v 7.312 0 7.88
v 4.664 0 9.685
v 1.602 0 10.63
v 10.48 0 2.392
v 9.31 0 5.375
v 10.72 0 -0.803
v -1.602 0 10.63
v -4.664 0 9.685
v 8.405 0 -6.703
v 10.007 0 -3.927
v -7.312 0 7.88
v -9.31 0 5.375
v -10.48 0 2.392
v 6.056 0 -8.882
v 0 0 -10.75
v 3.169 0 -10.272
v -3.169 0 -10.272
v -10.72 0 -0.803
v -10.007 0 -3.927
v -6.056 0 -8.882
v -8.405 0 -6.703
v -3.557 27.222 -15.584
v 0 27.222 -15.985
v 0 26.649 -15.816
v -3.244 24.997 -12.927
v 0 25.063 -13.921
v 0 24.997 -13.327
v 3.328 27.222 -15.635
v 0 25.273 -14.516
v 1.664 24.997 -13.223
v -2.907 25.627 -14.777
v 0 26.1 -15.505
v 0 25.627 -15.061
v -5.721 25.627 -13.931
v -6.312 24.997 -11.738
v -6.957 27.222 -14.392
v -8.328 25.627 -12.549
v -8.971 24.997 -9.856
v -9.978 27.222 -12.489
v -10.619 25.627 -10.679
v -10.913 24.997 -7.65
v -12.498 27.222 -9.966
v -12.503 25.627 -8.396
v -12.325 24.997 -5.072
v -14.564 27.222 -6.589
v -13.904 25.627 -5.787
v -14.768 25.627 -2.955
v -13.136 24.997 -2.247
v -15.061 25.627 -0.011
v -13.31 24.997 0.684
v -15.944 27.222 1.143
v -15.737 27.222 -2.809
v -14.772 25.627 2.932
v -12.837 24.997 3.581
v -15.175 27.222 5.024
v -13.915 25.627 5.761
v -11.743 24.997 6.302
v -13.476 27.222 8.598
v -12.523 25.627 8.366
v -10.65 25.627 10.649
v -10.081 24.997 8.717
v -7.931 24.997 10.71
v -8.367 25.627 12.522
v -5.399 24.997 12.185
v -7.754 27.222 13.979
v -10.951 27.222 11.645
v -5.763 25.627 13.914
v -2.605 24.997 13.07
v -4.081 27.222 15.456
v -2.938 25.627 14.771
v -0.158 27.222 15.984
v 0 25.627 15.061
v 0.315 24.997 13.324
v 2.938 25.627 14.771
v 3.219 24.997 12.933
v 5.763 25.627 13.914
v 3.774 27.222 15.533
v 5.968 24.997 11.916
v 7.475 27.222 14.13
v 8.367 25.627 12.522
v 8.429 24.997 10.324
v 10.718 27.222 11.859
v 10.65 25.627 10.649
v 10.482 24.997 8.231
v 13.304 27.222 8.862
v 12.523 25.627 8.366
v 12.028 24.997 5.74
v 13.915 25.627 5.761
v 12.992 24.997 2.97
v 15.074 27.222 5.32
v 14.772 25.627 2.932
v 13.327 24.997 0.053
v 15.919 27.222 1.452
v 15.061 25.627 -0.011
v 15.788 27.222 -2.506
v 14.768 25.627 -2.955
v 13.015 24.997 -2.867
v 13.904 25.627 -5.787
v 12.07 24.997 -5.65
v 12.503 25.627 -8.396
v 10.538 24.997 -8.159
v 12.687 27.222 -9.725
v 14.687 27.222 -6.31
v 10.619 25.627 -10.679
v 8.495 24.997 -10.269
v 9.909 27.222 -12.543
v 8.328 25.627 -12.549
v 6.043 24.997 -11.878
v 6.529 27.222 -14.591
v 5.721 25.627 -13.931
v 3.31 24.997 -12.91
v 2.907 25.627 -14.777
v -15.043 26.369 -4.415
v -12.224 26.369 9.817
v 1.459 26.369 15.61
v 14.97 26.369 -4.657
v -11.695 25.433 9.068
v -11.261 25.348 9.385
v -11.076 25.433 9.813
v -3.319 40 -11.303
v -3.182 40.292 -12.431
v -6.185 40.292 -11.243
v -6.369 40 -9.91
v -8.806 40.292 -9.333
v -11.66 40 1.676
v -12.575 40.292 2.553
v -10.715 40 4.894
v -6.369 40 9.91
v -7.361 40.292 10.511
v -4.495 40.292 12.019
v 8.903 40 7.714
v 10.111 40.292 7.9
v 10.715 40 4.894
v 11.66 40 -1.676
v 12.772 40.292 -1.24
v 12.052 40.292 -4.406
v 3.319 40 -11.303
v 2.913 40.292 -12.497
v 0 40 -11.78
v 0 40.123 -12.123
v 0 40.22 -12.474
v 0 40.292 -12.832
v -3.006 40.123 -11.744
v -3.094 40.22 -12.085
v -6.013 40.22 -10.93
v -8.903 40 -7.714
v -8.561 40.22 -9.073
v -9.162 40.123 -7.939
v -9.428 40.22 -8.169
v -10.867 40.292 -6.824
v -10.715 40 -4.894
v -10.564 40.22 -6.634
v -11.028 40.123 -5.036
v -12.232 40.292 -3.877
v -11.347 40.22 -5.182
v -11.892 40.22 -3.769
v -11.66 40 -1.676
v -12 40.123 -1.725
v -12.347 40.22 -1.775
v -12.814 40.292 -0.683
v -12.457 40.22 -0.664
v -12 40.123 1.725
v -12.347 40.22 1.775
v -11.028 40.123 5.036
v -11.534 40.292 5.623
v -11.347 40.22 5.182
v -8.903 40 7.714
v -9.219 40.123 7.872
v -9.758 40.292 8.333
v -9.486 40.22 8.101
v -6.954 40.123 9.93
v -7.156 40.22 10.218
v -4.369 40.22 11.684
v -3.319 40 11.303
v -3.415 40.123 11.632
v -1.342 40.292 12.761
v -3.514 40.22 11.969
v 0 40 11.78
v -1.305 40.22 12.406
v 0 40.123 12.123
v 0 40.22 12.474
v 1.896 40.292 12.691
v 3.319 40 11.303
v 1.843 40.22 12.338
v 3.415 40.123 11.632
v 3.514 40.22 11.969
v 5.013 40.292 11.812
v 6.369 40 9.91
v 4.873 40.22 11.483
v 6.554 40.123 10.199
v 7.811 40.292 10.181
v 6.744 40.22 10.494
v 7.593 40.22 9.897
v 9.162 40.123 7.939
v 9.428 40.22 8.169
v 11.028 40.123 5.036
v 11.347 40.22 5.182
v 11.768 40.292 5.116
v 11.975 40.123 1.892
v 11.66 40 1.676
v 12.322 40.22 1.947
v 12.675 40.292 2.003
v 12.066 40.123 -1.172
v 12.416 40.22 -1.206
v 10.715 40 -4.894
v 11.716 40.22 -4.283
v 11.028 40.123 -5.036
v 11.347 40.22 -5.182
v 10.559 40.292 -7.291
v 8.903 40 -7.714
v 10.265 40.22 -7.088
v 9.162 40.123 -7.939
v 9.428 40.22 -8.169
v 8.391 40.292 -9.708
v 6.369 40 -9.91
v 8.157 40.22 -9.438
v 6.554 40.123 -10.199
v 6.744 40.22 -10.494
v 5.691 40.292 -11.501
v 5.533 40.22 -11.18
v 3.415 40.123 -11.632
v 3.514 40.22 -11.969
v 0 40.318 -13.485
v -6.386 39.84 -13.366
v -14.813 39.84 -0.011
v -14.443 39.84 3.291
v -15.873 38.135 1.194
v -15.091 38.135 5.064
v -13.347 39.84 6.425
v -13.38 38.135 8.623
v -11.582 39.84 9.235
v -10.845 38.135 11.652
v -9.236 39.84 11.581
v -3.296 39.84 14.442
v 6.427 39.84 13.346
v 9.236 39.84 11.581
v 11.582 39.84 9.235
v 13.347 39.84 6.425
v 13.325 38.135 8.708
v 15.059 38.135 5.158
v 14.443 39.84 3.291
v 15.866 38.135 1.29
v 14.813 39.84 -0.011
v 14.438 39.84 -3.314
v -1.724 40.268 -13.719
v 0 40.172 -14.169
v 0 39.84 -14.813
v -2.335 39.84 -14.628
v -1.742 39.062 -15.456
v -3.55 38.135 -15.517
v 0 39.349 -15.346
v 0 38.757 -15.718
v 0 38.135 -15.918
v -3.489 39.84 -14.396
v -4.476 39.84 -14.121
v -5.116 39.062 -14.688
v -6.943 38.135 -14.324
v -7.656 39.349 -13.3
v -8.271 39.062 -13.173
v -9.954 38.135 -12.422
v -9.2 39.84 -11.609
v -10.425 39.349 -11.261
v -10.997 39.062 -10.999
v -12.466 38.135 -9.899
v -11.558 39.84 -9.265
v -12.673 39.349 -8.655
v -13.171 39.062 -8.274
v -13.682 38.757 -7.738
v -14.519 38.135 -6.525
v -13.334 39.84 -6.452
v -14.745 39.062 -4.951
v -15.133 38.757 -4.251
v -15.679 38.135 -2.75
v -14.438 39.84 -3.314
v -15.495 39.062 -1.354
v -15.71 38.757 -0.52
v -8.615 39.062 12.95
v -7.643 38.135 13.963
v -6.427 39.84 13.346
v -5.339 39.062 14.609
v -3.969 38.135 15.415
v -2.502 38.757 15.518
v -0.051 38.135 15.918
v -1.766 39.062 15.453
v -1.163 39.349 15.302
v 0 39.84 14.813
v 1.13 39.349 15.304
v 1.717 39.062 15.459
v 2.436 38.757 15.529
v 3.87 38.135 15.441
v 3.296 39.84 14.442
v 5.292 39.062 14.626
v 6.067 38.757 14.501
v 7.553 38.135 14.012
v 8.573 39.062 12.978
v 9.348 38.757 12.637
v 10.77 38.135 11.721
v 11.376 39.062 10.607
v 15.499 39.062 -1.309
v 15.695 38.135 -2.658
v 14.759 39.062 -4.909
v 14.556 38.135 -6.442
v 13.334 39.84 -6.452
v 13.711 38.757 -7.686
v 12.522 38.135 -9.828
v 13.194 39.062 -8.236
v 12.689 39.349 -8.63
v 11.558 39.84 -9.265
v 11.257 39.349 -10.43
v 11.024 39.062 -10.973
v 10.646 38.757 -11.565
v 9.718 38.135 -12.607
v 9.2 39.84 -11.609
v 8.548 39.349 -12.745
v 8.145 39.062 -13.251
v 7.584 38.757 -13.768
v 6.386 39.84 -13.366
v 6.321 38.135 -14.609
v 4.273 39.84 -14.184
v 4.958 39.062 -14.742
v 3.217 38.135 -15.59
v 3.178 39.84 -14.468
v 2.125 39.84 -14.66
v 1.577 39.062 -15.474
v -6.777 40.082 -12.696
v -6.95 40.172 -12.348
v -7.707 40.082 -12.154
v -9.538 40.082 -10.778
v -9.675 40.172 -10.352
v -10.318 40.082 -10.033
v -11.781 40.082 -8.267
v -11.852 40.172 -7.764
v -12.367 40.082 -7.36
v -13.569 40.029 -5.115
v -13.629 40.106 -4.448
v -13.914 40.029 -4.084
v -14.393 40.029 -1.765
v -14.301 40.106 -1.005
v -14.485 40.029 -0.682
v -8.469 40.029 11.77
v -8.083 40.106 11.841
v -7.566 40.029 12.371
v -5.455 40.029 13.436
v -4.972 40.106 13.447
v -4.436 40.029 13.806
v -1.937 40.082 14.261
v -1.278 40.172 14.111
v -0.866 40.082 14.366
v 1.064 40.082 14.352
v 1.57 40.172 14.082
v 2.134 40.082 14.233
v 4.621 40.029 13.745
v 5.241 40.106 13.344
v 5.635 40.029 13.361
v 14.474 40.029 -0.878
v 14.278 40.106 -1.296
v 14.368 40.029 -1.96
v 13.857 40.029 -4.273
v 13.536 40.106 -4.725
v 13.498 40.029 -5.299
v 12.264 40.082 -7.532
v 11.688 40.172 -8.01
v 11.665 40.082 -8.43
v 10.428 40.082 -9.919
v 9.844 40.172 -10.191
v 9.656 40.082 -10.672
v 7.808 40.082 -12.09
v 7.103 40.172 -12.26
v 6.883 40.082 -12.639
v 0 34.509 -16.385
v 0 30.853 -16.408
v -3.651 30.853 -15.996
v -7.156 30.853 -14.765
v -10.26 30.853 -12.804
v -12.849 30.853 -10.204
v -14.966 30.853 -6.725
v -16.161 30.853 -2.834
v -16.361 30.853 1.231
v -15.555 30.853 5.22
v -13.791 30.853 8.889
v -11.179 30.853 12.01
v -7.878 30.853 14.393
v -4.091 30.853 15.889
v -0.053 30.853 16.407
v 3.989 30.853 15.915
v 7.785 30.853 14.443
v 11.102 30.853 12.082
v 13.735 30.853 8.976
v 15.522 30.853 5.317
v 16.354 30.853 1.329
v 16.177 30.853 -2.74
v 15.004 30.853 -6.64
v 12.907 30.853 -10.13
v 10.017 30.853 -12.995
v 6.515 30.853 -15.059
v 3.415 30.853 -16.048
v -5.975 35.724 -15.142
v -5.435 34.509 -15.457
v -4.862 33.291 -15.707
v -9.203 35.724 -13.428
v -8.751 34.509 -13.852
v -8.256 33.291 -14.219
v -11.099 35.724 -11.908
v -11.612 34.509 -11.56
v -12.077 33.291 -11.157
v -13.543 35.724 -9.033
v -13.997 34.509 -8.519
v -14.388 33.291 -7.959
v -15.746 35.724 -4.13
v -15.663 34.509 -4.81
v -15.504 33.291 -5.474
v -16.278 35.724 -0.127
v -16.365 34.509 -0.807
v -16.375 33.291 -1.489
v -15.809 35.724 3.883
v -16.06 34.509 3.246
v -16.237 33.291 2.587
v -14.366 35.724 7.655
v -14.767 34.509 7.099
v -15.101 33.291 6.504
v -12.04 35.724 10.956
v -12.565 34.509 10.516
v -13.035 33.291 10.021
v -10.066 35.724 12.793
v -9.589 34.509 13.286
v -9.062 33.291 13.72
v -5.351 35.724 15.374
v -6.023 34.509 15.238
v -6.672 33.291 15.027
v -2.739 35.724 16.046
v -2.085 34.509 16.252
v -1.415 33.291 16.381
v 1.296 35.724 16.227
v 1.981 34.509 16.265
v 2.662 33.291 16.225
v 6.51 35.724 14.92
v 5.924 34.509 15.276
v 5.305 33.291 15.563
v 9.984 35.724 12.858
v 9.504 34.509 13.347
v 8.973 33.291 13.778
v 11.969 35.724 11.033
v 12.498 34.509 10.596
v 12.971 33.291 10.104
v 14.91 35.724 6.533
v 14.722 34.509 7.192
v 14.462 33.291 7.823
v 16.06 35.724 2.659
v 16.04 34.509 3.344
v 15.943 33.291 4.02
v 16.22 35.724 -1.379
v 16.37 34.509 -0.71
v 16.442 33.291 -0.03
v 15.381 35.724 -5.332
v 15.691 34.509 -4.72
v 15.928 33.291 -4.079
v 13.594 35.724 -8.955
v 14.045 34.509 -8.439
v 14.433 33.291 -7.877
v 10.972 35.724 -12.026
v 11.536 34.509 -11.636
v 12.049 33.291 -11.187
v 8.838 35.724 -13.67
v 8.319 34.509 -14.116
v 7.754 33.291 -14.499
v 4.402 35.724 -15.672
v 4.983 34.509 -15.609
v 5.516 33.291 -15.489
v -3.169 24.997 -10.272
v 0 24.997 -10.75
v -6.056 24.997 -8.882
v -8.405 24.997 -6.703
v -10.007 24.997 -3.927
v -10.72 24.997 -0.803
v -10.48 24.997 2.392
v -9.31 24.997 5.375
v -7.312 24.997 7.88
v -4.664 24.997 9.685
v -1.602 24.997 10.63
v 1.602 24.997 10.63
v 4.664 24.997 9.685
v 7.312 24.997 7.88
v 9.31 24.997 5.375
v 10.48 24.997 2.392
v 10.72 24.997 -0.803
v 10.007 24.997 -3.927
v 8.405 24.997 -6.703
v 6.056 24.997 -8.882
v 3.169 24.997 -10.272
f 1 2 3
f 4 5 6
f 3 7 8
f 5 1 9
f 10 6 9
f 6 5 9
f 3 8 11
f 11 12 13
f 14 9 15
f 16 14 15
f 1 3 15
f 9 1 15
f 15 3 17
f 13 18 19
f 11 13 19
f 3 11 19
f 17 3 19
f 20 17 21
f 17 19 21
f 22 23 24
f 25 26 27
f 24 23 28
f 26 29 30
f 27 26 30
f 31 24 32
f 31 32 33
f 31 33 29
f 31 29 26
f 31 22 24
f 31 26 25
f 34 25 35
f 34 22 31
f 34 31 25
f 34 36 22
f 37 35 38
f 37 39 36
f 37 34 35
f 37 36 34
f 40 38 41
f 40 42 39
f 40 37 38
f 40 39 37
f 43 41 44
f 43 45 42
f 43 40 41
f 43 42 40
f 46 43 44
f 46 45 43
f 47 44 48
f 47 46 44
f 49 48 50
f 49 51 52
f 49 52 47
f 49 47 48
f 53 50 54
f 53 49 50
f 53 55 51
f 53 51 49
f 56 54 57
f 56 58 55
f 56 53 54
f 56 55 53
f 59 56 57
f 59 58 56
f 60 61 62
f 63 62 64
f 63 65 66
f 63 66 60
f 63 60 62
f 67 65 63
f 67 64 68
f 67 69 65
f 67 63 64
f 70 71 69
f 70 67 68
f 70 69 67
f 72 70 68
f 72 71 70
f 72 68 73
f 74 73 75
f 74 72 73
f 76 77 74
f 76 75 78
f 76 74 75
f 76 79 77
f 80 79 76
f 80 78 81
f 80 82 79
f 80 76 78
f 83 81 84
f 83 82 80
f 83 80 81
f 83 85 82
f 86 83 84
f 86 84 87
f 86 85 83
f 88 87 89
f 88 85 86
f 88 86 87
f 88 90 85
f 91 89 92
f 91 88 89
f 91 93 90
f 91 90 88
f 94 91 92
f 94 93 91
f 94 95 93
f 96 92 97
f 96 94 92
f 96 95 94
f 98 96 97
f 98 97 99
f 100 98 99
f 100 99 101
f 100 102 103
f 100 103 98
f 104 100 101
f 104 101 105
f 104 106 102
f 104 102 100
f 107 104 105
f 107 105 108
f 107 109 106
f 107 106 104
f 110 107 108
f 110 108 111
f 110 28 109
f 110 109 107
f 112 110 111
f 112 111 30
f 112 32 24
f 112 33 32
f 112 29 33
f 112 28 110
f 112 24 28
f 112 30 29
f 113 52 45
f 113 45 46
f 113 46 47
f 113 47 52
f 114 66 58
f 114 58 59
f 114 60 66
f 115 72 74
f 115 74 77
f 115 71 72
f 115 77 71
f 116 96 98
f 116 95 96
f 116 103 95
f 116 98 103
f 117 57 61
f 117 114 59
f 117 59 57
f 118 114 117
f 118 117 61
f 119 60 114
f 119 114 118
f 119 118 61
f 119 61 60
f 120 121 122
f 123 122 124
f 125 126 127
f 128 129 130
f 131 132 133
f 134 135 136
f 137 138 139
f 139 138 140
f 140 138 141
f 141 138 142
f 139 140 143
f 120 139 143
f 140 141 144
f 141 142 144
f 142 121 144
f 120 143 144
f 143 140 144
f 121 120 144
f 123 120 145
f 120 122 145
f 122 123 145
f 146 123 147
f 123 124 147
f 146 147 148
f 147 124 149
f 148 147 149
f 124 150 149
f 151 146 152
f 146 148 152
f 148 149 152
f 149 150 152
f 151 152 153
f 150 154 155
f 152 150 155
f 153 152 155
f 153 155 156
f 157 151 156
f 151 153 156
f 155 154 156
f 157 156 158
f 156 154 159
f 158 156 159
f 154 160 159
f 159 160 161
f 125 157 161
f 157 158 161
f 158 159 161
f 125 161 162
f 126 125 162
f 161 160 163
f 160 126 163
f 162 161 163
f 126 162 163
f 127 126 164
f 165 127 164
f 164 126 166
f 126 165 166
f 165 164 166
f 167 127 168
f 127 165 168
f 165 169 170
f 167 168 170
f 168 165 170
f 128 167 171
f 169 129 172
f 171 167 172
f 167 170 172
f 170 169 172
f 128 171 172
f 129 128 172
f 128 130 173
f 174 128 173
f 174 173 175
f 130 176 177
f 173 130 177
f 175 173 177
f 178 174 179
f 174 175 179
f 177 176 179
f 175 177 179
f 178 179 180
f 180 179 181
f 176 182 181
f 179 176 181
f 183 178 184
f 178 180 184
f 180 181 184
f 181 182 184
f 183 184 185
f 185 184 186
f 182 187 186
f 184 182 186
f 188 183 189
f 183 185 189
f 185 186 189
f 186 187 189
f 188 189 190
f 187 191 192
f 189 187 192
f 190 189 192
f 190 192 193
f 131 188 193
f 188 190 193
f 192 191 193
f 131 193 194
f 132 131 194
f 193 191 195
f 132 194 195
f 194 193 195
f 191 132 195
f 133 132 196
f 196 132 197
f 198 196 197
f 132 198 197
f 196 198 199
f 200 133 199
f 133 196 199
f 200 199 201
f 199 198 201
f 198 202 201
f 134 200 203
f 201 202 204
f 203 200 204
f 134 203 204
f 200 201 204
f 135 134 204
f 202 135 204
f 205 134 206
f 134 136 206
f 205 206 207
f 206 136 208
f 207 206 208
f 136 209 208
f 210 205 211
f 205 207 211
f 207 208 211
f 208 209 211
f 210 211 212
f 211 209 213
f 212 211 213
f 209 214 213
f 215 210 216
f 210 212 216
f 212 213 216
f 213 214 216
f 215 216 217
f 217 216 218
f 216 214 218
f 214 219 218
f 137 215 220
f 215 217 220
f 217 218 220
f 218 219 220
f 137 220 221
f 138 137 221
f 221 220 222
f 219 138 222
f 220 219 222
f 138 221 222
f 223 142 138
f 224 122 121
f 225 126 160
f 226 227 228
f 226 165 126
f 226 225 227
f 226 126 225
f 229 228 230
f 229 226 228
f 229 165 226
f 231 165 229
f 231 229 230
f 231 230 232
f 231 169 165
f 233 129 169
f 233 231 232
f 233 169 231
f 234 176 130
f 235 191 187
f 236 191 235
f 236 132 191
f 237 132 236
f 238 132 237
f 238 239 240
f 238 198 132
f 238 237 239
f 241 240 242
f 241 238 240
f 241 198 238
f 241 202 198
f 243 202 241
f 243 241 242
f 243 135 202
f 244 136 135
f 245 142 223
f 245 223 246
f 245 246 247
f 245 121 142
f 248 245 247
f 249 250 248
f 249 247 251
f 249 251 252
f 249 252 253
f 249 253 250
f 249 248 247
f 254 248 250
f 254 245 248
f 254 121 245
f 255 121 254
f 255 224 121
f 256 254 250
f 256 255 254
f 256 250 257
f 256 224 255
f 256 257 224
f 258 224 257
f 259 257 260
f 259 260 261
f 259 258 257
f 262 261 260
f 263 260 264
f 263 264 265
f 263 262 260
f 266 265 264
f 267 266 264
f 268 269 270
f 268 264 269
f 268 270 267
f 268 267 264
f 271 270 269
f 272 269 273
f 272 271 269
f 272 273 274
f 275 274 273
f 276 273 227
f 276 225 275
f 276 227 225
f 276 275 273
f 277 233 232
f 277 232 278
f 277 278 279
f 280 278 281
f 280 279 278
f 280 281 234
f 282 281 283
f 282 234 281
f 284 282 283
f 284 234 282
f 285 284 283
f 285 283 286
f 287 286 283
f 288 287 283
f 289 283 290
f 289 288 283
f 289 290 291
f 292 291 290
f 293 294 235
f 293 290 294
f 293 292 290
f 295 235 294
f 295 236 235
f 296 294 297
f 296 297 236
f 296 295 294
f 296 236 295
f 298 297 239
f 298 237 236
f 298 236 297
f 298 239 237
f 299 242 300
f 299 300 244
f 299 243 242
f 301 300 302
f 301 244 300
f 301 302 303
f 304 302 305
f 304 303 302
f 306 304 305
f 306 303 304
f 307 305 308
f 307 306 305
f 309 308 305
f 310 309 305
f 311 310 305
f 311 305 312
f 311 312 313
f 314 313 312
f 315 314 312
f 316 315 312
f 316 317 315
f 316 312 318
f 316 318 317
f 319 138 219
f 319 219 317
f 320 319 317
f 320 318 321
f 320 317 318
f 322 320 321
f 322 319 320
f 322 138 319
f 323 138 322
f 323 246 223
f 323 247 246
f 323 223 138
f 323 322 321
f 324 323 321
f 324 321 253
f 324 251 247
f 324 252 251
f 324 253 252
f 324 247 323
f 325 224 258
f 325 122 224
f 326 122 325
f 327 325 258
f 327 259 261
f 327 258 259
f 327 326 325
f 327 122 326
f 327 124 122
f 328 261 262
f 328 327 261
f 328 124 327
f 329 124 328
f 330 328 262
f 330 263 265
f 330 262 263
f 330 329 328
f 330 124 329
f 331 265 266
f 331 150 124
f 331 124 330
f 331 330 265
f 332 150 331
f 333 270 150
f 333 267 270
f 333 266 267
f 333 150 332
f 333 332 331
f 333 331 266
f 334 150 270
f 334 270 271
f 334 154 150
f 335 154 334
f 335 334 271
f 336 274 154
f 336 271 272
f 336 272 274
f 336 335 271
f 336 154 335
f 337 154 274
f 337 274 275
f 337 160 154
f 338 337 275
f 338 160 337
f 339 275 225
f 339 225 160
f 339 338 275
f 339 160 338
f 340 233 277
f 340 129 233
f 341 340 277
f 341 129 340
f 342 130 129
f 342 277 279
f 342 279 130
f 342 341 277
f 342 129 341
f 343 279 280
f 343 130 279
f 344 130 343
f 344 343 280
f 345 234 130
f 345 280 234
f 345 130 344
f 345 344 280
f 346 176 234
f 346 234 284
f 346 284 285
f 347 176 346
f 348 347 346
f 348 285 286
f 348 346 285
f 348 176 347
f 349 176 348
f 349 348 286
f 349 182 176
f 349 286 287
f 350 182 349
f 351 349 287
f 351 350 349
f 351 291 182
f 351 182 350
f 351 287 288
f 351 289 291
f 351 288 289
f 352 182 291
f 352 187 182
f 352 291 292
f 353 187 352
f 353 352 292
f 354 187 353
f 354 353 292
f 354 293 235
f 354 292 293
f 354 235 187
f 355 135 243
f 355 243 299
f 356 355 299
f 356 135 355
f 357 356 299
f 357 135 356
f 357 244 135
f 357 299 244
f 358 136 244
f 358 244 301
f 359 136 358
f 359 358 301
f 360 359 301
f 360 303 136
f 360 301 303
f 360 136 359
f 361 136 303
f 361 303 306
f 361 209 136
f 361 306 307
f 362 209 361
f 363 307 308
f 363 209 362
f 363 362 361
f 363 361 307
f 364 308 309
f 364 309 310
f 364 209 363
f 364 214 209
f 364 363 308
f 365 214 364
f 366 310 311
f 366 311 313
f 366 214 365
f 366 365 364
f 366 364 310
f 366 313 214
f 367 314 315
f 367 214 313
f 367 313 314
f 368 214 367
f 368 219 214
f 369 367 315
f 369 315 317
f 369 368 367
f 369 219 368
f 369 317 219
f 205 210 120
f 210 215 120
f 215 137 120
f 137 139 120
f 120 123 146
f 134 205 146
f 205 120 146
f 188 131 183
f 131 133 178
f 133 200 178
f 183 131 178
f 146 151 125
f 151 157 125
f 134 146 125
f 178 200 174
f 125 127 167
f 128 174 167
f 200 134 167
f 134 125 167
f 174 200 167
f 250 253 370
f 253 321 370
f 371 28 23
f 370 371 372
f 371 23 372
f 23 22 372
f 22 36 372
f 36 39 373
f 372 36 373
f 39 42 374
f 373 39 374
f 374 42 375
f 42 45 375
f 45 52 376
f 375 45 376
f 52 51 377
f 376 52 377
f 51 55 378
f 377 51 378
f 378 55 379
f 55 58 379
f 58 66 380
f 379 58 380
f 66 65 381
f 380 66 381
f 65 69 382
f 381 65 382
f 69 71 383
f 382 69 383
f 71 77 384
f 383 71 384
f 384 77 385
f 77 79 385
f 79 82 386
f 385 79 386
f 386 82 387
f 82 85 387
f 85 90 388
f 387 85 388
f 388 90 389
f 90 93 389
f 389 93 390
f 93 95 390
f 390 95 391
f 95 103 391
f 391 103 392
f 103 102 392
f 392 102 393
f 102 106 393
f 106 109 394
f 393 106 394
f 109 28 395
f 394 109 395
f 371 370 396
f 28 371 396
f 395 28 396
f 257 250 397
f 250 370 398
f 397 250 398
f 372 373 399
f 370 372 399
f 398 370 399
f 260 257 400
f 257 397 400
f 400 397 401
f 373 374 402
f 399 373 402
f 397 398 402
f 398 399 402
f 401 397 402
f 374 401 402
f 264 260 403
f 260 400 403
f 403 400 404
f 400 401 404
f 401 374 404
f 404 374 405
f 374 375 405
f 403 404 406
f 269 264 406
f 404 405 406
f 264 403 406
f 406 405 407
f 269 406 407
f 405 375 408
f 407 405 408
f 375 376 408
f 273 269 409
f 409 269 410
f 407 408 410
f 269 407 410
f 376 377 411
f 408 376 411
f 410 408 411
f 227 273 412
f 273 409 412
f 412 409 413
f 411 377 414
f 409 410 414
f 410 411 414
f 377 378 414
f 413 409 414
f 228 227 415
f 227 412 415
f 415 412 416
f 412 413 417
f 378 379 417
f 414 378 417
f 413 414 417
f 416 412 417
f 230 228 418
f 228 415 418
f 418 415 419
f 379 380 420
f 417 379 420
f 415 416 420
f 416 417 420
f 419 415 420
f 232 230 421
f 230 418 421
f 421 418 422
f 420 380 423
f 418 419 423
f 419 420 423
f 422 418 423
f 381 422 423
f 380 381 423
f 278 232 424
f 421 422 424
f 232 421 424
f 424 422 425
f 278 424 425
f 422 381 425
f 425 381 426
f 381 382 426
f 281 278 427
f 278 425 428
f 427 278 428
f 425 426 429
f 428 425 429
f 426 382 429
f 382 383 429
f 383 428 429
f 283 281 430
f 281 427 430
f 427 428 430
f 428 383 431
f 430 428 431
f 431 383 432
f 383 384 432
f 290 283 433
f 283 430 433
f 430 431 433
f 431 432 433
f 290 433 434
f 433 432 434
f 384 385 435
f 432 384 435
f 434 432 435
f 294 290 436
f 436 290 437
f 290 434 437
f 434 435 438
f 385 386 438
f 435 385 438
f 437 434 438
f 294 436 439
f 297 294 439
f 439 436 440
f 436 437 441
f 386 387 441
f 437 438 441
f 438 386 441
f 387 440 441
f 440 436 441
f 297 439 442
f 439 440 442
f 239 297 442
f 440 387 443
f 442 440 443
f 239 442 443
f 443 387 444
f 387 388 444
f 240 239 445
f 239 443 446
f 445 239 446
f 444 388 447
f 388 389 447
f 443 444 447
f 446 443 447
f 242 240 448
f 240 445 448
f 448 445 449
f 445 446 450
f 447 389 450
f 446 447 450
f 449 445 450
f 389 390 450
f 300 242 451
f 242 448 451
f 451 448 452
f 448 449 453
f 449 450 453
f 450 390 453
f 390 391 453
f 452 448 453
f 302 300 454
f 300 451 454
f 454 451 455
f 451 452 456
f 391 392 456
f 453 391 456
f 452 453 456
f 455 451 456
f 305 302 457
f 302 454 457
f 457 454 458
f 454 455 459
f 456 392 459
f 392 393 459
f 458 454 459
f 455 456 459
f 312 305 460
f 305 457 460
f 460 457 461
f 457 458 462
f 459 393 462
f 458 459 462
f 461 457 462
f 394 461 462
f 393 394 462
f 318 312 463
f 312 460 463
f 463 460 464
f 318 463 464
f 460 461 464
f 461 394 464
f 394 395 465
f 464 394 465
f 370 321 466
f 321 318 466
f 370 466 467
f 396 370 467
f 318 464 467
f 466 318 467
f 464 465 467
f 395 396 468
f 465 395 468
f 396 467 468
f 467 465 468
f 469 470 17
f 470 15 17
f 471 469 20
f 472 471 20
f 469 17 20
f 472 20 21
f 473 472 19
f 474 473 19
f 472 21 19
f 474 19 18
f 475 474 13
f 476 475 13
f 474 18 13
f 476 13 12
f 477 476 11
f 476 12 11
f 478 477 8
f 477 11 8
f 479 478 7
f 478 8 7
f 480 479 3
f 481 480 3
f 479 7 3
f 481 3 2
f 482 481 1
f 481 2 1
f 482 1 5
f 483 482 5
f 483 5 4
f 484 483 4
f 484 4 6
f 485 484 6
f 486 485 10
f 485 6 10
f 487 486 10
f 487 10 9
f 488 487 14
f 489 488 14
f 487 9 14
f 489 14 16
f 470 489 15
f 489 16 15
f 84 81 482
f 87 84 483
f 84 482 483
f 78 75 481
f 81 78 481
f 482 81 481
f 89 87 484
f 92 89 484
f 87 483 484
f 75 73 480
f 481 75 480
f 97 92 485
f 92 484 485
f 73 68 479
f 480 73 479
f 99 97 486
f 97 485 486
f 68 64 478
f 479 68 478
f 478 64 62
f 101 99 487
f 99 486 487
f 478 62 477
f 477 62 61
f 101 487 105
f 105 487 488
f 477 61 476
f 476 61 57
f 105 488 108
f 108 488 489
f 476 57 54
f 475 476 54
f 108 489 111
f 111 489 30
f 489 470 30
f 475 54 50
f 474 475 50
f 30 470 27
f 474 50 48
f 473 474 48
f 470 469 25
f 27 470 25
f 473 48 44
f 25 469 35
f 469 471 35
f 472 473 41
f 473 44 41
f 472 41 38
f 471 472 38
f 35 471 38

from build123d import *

# Parameters (mm, degrees)
ZAOBLIT1_R = 2.7


with BuildPart() as part:
    # Skica1 → Rotovat1 (revolve)
    with BuildSketch(Plane.XY, mode=Mode.PRIVATE) as rotovat1_sk:
        with BuildLine():
            Line((0, 0), (0, 40))
            Line((0, 40), (-11.78, 40))
            ThreePointArc((-11.78, 40), (-13.640287208, 40.357347759), (-15.5, 39.997022564))
            ThreePointArc((-15.5, 39.997022564), (-16.452624903, 32.497022564), (-15.5, 24.997022564))
            Line((-15.5, 24.997022564), (-10.75, 24.997022564))
            Line((-10.75, 24.997022564), (-10.75, 0))
            Line((-10.75, 0), (0, 0))
        make_face()
    revolve(rotovat1_sk.sketch.rotate(Axis((0, 0, 0), (0, 1, 0)), 270), axis=Axis((0, 0, 0), (0, 1, 0)))

    # Zaoblit1
    zaoblit1_edges = [part.edges().sort_by_distance(p)[0] for p in [
        (0, 39.997022564, 15.5),
        (0, 24.997022564, 15.5),
    ]]
    fillet(zaoblit1_edges, radius=ZAOBLIT1_R)


solid = part.part
